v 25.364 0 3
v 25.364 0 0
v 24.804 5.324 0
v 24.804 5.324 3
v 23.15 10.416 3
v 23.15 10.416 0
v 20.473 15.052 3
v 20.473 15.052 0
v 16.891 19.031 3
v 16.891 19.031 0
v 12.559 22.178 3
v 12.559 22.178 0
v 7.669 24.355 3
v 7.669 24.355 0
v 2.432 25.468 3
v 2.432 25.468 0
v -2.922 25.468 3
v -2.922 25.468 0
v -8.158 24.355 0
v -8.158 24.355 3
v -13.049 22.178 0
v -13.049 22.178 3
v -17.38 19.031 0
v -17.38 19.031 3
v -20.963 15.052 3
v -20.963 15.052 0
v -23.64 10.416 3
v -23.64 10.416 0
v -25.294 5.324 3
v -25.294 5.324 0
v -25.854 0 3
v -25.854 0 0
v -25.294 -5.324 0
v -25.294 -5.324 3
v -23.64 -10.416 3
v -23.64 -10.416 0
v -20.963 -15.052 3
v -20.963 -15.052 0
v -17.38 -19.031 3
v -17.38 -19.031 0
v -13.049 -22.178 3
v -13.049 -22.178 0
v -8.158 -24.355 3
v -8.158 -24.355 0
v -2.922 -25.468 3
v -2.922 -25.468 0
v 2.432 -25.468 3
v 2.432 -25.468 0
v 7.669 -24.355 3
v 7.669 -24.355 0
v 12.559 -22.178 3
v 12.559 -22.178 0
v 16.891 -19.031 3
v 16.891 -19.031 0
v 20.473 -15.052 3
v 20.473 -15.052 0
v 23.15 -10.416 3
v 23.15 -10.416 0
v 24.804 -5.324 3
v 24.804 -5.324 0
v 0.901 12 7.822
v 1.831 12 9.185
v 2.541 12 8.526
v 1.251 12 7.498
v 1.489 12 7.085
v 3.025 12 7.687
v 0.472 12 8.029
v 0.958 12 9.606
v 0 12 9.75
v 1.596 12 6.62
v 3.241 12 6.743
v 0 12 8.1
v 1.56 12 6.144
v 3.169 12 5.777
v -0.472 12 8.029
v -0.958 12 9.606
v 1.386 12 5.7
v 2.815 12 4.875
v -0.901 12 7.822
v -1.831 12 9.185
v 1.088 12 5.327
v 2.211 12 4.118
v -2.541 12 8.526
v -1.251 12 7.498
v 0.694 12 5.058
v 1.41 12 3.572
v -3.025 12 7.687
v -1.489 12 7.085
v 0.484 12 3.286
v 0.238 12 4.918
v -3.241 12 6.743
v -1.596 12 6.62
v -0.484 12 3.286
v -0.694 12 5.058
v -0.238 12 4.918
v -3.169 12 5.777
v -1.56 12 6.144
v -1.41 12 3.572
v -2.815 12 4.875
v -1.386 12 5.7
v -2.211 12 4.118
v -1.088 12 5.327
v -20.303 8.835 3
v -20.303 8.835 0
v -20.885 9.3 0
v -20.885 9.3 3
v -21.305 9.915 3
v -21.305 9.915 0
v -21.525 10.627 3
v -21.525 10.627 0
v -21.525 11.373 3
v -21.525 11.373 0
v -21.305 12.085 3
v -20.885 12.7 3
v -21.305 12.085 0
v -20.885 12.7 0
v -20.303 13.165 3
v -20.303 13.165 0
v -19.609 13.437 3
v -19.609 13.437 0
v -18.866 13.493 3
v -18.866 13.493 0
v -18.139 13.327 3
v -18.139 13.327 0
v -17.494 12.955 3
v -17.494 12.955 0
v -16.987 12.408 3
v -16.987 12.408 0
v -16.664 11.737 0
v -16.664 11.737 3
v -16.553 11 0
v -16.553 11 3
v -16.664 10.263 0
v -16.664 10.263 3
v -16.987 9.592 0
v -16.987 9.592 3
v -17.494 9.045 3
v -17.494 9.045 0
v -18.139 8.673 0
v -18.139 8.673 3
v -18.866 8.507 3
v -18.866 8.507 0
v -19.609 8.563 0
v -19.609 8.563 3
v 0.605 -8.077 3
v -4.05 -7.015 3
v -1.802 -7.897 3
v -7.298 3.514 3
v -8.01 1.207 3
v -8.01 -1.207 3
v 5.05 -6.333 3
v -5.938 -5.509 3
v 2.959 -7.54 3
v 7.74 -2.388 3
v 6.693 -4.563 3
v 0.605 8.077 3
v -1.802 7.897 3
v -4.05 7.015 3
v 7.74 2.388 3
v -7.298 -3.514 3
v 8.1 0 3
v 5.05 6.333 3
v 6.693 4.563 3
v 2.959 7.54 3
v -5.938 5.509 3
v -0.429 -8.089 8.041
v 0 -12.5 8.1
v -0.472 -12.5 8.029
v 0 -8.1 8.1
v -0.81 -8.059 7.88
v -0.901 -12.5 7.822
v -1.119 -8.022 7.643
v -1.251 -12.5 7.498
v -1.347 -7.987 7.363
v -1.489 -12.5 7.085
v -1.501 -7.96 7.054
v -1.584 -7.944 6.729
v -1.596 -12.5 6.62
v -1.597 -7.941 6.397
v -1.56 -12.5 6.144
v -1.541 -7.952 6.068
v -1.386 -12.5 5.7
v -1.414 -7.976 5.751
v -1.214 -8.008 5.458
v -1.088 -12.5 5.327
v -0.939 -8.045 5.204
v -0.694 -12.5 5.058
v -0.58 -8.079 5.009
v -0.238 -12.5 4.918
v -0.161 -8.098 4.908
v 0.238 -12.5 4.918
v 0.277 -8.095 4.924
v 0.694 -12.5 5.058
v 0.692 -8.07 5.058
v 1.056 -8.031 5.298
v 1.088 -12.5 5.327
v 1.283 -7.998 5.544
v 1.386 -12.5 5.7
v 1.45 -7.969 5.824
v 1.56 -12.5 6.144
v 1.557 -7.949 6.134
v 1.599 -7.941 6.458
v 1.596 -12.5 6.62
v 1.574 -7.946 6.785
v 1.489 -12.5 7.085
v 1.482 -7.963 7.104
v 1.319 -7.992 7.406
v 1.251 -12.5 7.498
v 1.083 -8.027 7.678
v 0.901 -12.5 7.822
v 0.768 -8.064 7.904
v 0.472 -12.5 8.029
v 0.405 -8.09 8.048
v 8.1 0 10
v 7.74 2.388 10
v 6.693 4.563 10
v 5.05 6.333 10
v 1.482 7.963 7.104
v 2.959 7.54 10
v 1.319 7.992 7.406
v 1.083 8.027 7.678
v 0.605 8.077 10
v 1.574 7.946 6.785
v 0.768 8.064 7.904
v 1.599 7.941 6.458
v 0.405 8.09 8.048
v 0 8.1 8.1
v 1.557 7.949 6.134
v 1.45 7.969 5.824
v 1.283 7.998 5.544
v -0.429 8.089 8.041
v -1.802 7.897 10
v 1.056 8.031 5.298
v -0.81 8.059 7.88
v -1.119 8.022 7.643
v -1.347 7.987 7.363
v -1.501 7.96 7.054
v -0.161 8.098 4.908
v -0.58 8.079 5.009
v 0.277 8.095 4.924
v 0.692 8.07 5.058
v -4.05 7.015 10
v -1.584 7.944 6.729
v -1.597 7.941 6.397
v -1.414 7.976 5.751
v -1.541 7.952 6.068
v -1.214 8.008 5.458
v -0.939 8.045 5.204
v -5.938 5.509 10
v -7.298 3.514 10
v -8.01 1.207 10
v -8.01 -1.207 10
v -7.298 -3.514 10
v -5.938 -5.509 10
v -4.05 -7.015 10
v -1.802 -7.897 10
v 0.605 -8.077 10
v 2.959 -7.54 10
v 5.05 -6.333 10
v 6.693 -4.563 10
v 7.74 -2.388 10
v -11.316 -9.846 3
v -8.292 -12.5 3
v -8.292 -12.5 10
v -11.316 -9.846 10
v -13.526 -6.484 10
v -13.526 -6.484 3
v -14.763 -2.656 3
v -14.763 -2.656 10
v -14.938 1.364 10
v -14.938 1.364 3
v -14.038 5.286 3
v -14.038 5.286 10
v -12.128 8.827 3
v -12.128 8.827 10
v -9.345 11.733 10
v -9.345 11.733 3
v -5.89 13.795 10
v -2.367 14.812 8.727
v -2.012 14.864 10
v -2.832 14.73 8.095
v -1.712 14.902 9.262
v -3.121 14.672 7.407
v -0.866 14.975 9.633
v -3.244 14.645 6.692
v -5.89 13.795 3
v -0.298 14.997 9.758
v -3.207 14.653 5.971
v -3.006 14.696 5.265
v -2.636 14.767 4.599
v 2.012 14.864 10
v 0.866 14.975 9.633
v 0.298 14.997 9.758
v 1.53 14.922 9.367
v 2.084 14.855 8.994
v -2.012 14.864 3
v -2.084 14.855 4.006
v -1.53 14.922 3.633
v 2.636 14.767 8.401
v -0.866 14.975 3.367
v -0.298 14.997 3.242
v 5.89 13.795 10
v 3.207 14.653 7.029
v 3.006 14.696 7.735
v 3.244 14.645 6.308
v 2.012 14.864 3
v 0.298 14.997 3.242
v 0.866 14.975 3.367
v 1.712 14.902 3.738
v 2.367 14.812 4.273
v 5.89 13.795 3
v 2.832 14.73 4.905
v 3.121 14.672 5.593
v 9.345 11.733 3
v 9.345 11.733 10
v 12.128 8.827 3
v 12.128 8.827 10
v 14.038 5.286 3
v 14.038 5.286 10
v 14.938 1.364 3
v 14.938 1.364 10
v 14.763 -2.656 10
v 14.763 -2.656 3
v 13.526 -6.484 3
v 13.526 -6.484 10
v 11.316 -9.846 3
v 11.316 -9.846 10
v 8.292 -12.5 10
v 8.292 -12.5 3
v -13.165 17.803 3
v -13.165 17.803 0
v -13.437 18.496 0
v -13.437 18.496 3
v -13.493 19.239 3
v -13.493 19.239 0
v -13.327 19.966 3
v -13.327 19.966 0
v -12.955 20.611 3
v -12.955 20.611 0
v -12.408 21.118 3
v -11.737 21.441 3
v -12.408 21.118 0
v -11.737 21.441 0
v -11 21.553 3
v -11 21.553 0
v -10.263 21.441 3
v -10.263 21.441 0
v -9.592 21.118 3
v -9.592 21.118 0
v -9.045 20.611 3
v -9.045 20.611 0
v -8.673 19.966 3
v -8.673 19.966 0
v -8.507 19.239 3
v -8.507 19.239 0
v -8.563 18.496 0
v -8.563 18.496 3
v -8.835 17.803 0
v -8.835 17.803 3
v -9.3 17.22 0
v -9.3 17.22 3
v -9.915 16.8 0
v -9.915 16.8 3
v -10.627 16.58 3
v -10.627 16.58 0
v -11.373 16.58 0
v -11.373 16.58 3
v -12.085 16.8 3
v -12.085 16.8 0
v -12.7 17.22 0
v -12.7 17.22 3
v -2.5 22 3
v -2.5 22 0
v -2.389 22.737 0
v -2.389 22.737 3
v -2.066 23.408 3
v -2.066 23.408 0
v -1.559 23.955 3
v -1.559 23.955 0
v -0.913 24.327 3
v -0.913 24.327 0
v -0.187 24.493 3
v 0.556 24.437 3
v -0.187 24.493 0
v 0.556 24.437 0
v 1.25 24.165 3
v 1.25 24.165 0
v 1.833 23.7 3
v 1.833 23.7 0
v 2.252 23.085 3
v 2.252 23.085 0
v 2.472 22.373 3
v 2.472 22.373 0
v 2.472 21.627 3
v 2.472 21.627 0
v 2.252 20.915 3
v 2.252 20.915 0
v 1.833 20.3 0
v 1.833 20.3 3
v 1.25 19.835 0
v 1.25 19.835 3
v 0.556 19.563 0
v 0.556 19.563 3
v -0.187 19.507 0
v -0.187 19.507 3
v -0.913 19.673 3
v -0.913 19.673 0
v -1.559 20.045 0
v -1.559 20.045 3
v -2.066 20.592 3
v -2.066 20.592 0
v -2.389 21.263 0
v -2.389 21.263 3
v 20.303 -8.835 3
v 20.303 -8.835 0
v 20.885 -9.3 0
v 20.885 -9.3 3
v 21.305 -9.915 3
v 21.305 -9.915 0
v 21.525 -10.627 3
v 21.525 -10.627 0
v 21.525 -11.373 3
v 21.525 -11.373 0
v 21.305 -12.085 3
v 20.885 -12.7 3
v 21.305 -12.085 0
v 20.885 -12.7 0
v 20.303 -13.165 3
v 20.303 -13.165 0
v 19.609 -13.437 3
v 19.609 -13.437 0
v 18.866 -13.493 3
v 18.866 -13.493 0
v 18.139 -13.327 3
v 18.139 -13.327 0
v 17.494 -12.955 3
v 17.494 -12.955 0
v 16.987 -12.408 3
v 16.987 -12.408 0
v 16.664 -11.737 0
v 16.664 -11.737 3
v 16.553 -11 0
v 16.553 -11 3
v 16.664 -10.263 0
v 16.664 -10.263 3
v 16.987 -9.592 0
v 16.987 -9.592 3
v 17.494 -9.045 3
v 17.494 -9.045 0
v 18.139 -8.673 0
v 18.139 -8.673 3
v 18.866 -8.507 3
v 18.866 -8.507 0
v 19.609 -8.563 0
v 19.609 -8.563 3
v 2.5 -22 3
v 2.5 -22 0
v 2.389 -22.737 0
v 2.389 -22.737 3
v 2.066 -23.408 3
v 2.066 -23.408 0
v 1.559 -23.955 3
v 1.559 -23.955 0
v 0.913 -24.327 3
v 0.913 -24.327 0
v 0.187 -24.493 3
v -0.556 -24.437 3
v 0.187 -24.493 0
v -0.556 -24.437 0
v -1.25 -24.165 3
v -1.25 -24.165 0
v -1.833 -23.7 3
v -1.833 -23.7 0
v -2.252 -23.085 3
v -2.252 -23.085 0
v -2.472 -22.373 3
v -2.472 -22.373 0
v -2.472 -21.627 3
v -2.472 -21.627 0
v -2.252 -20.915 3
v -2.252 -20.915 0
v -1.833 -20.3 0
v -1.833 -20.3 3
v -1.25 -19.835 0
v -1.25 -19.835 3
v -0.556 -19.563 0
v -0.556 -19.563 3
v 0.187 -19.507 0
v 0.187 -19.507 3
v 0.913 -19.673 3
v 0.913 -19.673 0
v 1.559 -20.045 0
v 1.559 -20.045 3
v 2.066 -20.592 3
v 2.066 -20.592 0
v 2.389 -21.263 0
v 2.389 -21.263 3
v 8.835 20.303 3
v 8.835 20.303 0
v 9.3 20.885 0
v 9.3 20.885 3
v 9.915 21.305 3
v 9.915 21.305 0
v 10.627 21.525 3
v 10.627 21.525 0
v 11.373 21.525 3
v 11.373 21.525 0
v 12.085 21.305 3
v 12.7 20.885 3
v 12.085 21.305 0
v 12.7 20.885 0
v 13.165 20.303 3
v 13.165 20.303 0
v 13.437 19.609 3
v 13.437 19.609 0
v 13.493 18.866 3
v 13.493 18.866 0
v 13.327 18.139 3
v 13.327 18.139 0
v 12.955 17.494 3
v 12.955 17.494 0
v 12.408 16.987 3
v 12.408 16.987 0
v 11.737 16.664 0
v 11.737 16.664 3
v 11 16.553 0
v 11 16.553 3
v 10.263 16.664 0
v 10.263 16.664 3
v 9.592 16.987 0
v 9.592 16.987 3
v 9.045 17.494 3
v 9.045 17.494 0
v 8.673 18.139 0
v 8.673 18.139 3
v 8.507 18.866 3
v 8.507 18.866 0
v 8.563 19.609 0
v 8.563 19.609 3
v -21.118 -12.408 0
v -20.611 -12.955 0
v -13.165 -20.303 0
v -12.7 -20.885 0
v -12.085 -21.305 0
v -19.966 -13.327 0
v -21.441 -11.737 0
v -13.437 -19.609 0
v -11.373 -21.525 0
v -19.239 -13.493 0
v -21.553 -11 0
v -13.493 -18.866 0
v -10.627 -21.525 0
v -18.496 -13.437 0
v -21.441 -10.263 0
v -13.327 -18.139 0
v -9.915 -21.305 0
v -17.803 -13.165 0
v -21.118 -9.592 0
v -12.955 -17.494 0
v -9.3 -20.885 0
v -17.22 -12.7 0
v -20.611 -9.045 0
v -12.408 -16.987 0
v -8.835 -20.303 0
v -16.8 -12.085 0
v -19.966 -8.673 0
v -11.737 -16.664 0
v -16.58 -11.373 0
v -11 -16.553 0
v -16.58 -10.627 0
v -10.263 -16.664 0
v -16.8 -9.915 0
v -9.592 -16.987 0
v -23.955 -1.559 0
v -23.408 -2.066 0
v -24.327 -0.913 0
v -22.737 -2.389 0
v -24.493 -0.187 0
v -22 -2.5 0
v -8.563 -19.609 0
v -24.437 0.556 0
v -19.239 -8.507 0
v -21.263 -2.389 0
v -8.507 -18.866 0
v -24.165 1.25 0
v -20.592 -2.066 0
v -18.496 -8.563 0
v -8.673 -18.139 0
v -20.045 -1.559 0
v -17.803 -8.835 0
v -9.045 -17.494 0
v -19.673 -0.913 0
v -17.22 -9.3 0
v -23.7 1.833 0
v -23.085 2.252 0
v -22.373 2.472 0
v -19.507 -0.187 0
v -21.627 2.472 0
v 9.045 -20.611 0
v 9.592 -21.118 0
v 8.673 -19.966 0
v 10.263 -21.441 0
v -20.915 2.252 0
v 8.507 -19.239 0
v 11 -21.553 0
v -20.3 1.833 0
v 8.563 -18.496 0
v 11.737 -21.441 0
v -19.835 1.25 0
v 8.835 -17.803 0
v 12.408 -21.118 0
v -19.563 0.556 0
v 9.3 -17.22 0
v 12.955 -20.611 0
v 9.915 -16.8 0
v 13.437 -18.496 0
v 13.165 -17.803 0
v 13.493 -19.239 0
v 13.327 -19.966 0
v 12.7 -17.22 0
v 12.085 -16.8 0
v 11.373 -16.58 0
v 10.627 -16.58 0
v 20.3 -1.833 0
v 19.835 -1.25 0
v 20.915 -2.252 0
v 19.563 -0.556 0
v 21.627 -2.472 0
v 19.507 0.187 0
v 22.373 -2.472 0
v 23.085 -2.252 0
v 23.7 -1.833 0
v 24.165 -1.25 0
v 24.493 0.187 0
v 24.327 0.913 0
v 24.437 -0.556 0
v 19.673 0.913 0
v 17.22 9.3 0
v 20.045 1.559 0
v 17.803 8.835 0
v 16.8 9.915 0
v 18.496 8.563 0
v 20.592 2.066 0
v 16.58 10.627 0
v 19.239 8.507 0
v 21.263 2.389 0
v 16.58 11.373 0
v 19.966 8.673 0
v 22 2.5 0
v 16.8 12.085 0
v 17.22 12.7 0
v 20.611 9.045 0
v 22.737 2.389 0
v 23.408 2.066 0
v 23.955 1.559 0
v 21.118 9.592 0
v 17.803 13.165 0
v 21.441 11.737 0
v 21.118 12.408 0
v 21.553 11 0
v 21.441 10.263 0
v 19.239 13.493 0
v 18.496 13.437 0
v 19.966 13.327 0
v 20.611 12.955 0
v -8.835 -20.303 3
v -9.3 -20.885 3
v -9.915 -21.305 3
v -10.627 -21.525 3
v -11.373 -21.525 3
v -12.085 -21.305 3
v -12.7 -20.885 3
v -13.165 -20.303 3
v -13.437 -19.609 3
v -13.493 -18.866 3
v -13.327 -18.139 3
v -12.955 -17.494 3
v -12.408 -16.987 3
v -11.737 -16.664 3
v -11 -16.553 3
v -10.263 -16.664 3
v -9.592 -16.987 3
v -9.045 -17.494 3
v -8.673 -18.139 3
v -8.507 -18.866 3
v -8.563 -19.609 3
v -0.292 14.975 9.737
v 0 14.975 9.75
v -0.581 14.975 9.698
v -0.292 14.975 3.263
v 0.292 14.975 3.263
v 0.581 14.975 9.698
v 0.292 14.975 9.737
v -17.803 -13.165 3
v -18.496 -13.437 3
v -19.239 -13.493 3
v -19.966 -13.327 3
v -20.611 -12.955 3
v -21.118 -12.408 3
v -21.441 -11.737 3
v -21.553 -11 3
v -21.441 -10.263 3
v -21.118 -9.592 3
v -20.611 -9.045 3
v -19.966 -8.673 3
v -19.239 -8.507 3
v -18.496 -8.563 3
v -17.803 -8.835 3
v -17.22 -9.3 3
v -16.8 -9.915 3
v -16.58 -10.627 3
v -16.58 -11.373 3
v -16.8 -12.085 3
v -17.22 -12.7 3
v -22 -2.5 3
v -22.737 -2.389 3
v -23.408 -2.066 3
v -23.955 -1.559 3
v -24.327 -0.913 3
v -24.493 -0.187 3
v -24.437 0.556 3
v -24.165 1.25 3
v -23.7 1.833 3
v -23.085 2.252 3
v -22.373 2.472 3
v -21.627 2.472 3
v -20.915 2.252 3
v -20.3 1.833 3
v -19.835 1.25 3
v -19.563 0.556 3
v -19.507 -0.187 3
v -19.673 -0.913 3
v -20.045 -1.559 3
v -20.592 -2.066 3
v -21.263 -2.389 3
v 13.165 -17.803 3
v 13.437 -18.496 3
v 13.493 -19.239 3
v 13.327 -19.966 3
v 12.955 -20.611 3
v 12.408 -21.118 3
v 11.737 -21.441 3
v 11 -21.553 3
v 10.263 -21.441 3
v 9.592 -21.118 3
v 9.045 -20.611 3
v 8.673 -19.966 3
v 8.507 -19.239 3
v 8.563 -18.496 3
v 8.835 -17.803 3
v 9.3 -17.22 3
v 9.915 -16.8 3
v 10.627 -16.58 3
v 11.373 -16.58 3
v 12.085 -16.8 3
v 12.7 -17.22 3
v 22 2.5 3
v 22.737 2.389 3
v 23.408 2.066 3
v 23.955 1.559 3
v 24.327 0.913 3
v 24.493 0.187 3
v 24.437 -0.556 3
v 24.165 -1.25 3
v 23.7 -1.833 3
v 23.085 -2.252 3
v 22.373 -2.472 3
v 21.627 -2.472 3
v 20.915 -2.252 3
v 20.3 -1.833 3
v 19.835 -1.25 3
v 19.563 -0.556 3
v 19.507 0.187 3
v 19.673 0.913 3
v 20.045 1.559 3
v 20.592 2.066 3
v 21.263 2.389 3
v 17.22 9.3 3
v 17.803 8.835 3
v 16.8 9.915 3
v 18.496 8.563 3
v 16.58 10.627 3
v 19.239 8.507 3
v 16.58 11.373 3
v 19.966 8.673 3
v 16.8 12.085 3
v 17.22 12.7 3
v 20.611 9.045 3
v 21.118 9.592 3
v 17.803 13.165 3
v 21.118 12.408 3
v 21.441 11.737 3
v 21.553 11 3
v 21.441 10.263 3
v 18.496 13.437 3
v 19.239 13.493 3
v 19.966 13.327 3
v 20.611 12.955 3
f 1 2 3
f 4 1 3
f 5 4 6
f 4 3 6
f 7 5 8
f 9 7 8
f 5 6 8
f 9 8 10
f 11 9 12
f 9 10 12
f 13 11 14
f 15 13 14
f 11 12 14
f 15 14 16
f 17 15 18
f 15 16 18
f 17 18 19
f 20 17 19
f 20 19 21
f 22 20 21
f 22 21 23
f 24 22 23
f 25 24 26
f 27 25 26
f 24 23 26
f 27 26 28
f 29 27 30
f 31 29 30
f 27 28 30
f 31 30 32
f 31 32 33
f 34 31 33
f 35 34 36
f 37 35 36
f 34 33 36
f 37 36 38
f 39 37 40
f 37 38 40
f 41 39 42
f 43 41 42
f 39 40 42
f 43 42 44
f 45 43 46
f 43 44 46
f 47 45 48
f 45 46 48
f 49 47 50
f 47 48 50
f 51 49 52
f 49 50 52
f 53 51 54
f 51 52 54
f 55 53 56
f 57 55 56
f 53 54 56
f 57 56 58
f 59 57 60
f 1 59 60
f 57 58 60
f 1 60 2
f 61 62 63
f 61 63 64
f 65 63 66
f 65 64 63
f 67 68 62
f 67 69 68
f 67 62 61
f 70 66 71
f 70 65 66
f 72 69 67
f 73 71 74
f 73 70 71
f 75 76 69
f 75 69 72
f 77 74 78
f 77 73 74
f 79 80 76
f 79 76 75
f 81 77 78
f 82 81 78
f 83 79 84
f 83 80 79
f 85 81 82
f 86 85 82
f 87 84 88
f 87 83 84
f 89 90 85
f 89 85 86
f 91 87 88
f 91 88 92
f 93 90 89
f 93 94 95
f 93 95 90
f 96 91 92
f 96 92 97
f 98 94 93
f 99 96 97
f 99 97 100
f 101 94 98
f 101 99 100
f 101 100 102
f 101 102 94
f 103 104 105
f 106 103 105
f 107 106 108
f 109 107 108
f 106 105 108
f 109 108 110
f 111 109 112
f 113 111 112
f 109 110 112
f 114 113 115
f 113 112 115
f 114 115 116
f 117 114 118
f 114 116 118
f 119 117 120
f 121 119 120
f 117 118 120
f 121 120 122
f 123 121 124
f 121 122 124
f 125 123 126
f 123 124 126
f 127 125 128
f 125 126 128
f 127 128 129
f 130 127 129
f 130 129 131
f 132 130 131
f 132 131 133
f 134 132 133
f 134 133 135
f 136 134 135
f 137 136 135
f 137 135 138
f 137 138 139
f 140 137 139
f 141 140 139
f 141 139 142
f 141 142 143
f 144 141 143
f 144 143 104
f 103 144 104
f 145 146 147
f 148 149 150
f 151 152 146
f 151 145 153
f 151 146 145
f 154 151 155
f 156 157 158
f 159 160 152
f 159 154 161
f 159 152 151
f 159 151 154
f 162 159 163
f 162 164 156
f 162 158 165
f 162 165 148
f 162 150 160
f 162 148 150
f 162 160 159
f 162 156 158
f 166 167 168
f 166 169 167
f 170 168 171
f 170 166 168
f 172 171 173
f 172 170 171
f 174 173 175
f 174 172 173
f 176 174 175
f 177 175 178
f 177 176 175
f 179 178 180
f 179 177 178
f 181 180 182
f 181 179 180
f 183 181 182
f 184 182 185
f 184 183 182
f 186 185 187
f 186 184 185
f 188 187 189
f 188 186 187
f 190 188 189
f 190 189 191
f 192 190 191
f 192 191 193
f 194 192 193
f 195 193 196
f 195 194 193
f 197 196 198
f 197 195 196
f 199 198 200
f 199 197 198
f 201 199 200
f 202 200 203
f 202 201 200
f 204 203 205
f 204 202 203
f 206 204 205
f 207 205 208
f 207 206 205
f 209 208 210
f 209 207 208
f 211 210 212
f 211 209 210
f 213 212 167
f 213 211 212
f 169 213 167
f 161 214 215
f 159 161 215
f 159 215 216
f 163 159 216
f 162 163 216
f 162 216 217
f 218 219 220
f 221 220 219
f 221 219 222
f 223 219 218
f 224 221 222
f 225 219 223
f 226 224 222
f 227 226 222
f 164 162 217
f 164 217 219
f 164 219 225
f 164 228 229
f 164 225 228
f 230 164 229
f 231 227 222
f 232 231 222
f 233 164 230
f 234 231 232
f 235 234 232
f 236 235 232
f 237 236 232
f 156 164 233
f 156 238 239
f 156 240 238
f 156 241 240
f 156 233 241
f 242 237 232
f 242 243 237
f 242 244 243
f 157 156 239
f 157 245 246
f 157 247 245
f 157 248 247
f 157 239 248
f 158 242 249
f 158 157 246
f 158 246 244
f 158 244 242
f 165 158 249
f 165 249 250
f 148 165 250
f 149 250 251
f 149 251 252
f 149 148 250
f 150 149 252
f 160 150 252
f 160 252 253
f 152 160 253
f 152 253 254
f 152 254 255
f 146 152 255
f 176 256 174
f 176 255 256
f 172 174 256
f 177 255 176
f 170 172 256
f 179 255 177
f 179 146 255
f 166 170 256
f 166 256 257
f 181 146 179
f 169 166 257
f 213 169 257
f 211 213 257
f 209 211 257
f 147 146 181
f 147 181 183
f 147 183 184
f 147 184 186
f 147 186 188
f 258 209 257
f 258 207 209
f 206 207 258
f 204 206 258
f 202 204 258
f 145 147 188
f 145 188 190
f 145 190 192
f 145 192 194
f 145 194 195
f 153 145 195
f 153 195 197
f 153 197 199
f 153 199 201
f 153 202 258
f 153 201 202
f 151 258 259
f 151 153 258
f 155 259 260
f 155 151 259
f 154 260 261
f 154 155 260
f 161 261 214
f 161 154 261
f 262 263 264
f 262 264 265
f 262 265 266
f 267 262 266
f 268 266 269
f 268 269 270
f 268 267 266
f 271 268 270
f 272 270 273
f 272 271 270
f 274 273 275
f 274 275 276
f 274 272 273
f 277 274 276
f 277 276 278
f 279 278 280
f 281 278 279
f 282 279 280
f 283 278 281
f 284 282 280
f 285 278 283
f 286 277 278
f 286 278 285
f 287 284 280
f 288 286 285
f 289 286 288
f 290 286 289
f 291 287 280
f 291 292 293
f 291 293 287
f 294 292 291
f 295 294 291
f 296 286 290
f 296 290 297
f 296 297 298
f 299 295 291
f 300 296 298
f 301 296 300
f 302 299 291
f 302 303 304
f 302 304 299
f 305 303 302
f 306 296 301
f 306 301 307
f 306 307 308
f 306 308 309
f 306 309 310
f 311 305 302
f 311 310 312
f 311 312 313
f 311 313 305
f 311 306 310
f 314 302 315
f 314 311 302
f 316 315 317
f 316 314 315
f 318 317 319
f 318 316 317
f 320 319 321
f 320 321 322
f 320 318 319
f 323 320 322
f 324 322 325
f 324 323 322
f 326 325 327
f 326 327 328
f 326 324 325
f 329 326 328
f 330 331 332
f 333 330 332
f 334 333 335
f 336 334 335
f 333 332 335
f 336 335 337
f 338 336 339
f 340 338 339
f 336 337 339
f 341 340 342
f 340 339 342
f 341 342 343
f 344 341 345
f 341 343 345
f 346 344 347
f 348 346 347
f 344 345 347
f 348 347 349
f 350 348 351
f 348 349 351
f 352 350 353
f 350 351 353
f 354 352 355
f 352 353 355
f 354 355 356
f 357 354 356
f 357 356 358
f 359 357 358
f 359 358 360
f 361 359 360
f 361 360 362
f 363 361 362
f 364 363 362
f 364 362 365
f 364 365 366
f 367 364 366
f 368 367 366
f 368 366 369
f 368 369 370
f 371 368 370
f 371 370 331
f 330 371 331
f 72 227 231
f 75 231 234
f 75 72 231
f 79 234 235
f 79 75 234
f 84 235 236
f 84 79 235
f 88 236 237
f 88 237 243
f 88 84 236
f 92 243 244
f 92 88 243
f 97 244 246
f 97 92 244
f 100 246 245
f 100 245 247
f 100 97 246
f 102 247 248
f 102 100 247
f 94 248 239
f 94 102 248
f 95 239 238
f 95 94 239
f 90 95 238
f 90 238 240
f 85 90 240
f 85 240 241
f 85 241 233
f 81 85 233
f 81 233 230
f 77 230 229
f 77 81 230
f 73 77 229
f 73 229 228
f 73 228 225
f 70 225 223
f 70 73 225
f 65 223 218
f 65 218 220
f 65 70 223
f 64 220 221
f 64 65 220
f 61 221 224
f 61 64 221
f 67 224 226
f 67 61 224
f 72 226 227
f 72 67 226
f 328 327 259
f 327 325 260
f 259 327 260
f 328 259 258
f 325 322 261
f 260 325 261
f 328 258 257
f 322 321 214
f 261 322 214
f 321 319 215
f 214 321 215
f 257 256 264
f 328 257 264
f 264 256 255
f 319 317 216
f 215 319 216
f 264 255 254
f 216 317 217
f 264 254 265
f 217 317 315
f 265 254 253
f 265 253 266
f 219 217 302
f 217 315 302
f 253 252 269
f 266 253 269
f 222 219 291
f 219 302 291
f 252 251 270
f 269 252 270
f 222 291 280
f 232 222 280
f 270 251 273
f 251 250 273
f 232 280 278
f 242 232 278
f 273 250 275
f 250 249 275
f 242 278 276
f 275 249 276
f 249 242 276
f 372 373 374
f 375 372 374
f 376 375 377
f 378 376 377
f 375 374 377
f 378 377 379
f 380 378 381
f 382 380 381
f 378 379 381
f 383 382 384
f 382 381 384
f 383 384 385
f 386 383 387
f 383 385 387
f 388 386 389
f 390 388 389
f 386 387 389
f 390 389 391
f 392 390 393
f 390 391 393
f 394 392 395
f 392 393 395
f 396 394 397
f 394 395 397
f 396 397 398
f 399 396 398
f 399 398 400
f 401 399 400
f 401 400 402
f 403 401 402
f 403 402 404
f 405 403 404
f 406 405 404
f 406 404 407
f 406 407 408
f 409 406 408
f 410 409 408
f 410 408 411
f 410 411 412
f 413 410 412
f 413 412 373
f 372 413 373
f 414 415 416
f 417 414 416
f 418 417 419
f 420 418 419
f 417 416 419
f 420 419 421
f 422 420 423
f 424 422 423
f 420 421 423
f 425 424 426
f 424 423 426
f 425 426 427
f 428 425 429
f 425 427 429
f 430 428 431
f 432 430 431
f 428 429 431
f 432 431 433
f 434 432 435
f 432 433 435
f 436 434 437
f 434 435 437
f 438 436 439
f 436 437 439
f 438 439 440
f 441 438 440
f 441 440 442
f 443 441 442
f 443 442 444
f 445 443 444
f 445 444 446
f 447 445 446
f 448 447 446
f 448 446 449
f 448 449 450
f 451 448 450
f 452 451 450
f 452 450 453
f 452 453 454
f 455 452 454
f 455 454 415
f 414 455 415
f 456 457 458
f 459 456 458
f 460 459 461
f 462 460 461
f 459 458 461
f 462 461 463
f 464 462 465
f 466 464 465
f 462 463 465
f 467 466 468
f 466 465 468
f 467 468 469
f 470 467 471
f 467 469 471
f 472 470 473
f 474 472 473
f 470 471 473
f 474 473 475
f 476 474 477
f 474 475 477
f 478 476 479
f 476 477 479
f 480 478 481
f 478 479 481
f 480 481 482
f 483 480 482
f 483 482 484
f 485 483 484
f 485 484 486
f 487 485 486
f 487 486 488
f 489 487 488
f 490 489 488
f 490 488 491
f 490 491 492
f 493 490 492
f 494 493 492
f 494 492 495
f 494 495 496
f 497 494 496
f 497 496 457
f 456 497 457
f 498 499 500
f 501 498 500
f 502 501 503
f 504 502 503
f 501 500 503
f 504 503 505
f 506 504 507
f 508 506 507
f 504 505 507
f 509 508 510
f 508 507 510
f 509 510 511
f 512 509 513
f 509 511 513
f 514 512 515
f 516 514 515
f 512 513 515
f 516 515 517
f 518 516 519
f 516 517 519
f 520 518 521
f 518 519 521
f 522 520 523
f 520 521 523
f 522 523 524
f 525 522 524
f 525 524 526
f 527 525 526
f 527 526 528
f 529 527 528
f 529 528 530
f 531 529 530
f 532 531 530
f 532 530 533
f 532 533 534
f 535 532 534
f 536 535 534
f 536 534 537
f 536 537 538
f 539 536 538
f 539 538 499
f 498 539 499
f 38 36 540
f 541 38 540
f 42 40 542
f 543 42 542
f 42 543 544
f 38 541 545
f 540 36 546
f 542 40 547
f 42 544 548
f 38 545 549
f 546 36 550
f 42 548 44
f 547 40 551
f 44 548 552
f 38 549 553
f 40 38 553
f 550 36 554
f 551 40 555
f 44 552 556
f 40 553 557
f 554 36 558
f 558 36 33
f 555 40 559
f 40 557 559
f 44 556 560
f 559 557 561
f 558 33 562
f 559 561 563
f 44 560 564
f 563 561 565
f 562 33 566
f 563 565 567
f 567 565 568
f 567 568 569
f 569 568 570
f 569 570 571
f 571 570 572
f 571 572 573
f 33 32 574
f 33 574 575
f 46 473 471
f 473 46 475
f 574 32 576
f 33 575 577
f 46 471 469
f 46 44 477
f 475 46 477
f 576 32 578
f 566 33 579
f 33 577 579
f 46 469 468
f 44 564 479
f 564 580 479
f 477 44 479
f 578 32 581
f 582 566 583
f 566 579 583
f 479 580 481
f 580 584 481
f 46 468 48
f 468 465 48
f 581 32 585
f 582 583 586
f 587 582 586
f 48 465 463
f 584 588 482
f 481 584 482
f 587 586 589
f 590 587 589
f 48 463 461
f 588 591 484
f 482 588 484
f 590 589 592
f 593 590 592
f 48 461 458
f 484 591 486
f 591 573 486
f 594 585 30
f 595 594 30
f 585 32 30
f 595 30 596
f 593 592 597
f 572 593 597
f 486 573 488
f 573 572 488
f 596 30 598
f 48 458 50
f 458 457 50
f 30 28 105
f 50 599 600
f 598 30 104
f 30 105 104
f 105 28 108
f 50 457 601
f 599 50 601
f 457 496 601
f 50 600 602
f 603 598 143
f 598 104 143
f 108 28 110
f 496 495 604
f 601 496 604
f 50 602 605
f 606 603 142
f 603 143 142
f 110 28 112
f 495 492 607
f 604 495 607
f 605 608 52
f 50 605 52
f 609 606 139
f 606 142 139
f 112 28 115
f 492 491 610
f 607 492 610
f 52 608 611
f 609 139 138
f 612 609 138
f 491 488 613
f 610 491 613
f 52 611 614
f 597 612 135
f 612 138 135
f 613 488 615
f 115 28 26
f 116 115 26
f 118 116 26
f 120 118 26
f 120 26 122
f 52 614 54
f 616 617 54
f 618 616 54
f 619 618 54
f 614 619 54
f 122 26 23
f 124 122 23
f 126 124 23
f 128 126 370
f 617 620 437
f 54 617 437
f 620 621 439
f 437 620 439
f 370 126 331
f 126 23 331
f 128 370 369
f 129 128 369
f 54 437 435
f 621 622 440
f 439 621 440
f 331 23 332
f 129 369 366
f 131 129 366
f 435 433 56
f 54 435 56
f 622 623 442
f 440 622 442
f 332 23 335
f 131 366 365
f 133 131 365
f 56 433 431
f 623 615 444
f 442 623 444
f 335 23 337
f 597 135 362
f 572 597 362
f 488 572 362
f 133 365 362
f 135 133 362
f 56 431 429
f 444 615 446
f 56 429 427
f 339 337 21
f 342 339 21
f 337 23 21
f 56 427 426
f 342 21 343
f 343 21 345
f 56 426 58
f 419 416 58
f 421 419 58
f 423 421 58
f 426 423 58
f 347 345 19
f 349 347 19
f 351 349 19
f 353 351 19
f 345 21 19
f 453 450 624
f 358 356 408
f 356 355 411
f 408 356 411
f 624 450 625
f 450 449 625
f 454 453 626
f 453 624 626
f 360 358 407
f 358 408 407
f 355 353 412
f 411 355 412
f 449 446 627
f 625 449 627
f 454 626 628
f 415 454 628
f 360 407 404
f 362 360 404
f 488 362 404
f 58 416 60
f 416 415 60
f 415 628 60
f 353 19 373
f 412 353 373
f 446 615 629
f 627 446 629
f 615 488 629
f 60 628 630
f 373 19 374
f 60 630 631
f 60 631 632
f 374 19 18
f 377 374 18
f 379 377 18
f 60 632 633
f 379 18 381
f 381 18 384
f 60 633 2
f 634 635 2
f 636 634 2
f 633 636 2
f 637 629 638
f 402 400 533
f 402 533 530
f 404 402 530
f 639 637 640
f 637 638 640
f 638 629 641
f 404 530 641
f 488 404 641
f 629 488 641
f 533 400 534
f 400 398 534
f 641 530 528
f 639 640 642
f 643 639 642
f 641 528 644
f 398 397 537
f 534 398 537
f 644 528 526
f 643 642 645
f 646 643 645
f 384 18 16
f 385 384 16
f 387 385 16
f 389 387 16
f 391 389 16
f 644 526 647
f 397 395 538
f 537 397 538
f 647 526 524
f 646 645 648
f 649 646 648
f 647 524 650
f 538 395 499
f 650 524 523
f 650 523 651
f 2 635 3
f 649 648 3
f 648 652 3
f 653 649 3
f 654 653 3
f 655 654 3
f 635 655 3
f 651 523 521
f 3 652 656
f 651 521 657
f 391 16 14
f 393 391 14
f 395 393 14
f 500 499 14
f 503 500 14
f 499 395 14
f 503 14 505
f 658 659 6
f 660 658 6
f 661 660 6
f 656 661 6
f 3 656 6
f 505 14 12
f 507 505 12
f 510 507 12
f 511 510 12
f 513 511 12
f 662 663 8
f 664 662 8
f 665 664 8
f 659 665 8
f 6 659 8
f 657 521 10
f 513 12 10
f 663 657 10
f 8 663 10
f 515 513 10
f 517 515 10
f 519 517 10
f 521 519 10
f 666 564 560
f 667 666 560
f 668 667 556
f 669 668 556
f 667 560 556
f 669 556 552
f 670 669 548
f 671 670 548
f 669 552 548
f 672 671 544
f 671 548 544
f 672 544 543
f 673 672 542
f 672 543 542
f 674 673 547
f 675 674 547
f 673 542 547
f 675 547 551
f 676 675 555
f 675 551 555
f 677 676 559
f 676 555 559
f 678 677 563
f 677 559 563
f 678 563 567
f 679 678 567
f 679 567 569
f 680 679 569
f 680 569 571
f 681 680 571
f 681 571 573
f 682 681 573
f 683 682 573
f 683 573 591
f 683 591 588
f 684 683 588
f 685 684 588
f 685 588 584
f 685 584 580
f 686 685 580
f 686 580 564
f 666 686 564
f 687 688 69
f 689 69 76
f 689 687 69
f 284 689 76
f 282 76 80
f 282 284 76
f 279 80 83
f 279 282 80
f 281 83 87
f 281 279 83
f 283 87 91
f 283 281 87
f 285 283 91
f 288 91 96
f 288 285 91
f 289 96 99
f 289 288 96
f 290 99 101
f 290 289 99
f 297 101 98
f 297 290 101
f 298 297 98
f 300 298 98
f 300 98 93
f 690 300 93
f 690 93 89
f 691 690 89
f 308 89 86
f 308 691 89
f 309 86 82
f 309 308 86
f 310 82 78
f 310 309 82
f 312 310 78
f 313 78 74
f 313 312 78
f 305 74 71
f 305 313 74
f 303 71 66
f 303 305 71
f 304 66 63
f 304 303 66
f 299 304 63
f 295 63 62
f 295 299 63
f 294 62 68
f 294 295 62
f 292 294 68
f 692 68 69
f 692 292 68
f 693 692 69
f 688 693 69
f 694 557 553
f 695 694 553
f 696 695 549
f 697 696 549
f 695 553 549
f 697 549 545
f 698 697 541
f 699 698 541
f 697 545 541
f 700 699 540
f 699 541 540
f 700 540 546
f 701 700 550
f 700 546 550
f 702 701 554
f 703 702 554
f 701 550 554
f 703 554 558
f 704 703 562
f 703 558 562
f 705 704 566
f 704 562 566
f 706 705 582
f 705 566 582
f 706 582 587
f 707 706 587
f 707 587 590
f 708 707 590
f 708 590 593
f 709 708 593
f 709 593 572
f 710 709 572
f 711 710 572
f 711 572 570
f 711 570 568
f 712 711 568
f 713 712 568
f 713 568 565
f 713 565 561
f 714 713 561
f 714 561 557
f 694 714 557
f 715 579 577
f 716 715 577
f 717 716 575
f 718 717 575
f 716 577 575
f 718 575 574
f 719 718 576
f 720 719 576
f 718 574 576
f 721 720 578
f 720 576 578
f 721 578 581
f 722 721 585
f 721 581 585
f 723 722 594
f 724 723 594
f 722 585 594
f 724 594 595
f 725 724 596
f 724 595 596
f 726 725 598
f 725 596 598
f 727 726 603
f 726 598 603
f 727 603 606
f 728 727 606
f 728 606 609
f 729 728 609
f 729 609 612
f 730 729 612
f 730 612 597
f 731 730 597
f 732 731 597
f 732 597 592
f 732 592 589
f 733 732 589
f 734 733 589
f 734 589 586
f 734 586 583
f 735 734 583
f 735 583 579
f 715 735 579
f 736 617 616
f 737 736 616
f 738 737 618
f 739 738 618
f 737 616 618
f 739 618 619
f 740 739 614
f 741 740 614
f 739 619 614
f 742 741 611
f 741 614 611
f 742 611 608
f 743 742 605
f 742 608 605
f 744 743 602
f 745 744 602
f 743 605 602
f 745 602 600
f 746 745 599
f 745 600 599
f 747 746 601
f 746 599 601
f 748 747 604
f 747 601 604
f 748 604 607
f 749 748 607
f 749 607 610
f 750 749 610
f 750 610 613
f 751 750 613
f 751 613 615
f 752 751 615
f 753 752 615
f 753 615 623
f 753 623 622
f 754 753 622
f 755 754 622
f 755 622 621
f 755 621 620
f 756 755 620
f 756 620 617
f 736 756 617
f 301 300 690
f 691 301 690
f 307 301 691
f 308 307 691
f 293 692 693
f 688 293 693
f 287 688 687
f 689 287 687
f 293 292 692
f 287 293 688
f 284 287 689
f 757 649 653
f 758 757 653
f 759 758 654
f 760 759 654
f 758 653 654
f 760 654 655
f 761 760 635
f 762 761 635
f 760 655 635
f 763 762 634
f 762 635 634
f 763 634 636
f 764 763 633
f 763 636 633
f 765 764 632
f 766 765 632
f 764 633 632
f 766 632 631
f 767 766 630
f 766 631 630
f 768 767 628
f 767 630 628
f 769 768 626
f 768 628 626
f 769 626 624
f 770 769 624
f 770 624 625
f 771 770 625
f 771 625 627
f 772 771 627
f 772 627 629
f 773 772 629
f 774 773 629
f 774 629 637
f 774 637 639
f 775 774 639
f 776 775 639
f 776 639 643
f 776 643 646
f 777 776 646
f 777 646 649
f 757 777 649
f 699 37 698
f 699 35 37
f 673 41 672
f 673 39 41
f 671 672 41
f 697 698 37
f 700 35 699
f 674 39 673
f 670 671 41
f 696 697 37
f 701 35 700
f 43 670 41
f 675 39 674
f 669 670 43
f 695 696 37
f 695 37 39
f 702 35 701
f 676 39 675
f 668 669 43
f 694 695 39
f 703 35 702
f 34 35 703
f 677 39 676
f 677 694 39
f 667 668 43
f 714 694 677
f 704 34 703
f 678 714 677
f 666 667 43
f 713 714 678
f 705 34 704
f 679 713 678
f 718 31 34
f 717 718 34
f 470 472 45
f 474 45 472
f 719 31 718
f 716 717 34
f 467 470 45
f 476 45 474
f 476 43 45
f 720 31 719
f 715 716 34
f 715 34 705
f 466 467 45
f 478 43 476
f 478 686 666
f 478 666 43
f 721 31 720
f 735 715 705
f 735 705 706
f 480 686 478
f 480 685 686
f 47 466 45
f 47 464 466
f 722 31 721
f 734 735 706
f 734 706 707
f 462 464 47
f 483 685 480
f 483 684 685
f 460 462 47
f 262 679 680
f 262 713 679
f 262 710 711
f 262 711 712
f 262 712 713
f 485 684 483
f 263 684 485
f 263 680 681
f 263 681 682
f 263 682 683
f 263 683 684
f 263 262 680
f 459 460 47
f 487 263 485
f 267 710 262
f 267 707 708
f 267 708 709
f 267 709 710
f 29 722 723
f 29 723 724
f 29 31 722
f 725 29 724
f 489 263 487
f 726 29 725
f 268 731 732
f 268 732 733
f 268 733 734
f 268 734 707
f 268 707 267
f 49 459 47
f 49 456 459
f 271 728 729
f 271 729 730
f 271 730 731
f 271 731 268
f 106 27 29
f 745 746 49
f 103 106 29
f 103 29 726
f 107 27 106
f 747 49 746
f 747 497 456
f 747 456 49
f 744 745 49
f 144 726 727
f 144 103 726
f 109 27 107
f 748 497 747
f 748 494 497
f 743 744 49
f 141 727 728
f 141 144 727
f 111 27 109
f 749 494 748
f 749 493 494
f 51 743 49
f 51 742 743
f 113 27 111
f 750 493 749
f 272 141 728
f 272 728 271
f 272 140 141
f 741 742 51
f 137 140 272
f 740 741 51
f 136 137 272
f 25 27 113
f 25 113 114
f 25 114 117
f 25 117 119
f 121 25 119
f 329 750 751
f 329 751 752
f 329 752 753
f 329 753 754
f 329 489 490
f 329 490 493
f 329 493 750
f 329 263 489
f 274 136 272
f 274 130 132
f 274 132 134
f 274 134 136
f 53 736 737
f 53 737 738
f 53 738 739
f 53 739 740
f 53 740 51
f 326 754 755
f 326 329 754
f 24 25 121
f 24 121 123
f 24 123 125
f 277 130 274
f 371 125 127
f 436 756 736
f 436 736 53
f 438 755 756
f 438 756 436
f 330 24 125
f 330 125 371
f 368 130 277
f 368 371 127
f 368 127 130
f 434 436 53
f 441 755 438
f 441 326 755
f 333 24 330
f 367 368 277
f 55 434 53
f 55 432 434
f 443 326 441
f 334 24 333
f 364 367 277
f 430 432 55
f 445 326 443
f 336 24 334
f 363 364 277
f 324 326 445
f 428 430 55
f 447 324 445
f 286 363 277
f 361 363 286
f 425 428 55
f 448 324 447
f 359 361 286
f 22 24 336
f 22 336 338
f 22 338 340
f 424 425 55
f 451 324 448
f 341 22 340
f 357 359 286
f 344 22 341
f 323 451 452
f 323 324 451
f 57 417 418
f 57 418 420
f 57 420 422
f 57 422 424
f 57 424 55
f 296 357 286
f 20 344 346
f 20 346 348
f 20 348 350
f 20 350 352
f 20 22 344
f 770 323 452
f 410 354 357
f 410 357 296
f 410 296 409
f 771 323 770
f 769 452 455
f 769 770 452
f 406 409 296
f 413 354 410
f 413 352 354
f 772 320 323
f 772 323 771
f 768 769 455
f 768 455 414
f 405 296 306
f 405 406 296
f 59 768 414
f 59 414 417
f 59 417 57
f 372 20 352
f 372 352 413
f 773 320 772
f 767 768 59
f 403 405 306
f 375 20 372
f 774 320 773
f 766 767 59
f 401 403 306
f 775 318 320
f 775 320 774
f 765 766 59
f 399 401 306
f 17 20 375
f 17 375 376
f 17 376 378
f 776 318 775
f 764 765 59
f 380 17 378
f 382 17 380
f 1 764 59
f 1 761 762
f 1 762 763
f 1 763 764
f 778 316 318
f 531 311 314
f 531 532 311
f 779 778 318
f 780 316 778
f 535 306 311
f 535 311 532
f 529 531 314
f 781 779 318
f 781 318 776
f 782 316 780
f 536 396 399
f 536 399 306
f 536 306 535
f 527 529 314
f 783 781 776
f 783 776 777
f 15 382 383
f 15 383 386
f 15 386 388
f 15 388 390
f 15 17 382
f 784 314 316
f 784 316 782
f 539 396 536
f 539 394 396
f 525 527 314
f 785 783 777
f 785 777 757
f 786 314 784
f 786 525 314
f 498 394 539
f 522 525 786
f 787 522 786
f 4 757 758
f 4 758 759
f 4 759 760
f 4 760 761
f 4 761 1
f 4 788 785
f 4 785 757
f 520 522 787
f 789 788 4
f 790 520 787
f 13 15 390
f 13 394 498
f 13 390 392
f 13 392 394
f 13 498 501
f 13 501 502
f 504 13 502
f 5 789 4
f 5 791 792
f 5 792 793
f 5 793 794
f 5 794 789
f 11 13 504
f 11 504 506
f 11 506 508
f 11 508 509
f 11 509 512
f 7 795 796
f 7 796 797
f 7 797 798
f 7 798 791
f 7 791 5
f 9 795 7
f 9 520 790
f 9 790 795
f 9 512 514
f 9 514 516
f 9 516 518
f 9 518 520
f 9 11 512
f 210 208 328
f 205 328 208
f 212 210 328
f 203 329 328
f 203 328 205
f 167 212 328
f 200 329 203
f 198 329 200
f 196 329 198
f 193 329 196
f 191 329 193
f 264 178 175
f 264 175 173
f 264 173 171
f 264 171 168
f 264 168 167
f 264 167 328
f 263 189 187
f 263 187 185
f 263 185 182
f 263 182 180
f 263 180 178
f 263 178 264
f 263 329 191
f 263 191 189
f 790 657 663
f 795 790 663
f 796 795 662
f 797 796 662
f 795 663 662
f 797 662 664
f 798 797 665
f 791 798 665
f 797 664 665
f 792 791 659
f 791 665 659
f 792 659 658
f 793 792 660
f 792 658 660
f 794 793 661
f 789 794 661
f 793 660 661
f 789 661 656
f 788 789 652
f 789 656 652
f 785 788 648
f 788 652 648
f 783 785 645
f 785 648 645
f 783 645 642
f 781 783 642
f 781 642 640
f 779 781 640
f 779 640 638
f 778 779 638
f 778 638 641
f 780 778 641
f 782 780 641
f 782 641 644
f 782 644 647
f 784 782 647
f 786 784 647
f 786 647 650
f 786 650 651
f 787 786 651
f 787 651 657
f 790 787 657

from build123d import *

# Parameters (mm, degrees)
SKETCH1_R           = 25.608746635
BOSS_EXTRUDE1_DEPTH = 3
SKETCH2_R           = 8.1
BOSS_EXTRUDE2_DEPTH = 7
SKETCH7_R           = 2.5
CUT_EXTRUDE1_DEPTH  = 10
CIRPATTERN1_COUNT   = 12


with BuildPart() as part:
    # Sketch1 → Boss-Extrude1 (new body)
    with BuildSketch(Plane.XY):
        with Locations((-0.244898521, 0)):
            Circle(SKETCH1_R)
    extrude(amount=BOSS_EXTRUDE1_DEPTH)

    # Sketch2 → Boss-Extrude2 (add)
    with BuildSketch(Plane.XY.offset(3)):
        with BuildLine():
            Line((8.291561976, -12.5), (-8.291561976, -12.5))
            ThreePointArc((-8.291561976, -12.5), (0, 15), (8.291561976, -12.5))
        make_face()
        Circle(SKETCH2_R, mode=Mode.SUBTRACT)
    extrude(amount=BOSS_EXTRUDE2_DEPTH)

    # Sketch4 → CBORE for M3 SHCS1 (revolve, cut)
    with BuildSketch(Plane(origin=(0, 15, 6.5), x_dir=(0, 0, 1), z_dir=(1, 0, 0))):
        Polygon((0, 0), (0, 40.608746635), (1.6, 40.608746635), (1.6, 3), (3.25, 3), (3.25, 0.025), (3.275, 0), align=None)
    revolve(axis=Axis((0, 21.35, 6.5), (0, -1, 0)), mode=Mode.SUBTRACT)

    # Sketch7 → Cut-Extrude1 (cut)
    with BuildSketch(Plane(origin=(0, 0, 0), x_dir=(-1, 0, 0), z_dir=(0, 0, -1))):
        with Locations((0, 22)):
            Circle(SKETCH7_R)
    cut_extrude1 = extrude(amount=-CUT_EXTRUDE1_DEPTH, mode=Mode.SUBTRACT)

    # CirPattern1: Cut-Extrude1 ×12 about axis
    cirpattern1_axis = Axis((0, 0, 0), (0, 0, 1))
    for i in range(1, CIRPATTERN1_COUNT):
        add(cut_extrude1.rotate(cirpattern1_axis, i * 360 / CIRPATTERN1_COUNT), mode=Mode.SUBTRACT)


solid = part.part
